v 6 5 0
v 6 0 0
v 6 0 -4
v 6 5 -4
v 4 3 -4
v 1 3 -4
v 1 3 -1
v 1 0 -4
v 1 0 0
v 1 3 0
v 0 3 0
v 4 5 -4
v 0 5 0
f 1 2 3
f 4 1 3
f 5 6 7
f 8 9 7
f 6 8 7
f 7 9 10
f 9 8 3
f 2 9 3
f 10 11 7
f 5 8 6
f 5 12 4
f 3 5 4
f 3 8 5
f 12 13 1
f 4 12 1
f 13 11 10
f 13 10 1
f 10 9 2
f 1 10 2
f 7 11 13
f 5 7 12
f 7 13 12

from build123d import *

# Parameters (mm, degrees)
SKETCH2_W           = 6
SKETCH2_H           = 4
BOSS_EXTRUDE1_DEPTH = 5
SKETCH3_W           = 1
SKETCH3_H           = 3
CUT_EXTRUDE1_DEPTH  = 5
CUT_EXTRUDE3_DEPTH  = 2


with BuildPart() as part:
    # Sketch2 → Boss-Extrude1 (new body)
    with BuildSketch(Plane(origin=(0, 0, 0), x_dir=(1, 0, 0), z_dir=(0, 1, 0))):
        with Locations((3, 2)):
            Rectangle(SKETCH2_W, SKETCH2_H)
    extrude(amount=BOSS_EXTRUDE1_DEPTH)

    # Sketch3 → Cut-Extrude1 (cut)
    with BuildSketch(Plane.XY):
        with Locations((0.5, 1.5)):
            Rectangle(SKETCH3_W, SKETCH3_H)
    extrude(amount=-CUT_EXTRUDE1_DEPTH, mode=Mode.SUBTRACT)

    # Sketch5 → Cut-Extrude3 (cut)
    with BuildSketch(Plane(origin=(0, 5, 0), x_dir=(1, 0, 0), z_dir=(0, 1, 0))):
        Polygon((0, 0), (4, 4), (0, 4), align=None)
    extrude(amount=-CUT_EXTRUDE3_DEPTH, mode=Mode.SUBTRACT)


solid = part.part
